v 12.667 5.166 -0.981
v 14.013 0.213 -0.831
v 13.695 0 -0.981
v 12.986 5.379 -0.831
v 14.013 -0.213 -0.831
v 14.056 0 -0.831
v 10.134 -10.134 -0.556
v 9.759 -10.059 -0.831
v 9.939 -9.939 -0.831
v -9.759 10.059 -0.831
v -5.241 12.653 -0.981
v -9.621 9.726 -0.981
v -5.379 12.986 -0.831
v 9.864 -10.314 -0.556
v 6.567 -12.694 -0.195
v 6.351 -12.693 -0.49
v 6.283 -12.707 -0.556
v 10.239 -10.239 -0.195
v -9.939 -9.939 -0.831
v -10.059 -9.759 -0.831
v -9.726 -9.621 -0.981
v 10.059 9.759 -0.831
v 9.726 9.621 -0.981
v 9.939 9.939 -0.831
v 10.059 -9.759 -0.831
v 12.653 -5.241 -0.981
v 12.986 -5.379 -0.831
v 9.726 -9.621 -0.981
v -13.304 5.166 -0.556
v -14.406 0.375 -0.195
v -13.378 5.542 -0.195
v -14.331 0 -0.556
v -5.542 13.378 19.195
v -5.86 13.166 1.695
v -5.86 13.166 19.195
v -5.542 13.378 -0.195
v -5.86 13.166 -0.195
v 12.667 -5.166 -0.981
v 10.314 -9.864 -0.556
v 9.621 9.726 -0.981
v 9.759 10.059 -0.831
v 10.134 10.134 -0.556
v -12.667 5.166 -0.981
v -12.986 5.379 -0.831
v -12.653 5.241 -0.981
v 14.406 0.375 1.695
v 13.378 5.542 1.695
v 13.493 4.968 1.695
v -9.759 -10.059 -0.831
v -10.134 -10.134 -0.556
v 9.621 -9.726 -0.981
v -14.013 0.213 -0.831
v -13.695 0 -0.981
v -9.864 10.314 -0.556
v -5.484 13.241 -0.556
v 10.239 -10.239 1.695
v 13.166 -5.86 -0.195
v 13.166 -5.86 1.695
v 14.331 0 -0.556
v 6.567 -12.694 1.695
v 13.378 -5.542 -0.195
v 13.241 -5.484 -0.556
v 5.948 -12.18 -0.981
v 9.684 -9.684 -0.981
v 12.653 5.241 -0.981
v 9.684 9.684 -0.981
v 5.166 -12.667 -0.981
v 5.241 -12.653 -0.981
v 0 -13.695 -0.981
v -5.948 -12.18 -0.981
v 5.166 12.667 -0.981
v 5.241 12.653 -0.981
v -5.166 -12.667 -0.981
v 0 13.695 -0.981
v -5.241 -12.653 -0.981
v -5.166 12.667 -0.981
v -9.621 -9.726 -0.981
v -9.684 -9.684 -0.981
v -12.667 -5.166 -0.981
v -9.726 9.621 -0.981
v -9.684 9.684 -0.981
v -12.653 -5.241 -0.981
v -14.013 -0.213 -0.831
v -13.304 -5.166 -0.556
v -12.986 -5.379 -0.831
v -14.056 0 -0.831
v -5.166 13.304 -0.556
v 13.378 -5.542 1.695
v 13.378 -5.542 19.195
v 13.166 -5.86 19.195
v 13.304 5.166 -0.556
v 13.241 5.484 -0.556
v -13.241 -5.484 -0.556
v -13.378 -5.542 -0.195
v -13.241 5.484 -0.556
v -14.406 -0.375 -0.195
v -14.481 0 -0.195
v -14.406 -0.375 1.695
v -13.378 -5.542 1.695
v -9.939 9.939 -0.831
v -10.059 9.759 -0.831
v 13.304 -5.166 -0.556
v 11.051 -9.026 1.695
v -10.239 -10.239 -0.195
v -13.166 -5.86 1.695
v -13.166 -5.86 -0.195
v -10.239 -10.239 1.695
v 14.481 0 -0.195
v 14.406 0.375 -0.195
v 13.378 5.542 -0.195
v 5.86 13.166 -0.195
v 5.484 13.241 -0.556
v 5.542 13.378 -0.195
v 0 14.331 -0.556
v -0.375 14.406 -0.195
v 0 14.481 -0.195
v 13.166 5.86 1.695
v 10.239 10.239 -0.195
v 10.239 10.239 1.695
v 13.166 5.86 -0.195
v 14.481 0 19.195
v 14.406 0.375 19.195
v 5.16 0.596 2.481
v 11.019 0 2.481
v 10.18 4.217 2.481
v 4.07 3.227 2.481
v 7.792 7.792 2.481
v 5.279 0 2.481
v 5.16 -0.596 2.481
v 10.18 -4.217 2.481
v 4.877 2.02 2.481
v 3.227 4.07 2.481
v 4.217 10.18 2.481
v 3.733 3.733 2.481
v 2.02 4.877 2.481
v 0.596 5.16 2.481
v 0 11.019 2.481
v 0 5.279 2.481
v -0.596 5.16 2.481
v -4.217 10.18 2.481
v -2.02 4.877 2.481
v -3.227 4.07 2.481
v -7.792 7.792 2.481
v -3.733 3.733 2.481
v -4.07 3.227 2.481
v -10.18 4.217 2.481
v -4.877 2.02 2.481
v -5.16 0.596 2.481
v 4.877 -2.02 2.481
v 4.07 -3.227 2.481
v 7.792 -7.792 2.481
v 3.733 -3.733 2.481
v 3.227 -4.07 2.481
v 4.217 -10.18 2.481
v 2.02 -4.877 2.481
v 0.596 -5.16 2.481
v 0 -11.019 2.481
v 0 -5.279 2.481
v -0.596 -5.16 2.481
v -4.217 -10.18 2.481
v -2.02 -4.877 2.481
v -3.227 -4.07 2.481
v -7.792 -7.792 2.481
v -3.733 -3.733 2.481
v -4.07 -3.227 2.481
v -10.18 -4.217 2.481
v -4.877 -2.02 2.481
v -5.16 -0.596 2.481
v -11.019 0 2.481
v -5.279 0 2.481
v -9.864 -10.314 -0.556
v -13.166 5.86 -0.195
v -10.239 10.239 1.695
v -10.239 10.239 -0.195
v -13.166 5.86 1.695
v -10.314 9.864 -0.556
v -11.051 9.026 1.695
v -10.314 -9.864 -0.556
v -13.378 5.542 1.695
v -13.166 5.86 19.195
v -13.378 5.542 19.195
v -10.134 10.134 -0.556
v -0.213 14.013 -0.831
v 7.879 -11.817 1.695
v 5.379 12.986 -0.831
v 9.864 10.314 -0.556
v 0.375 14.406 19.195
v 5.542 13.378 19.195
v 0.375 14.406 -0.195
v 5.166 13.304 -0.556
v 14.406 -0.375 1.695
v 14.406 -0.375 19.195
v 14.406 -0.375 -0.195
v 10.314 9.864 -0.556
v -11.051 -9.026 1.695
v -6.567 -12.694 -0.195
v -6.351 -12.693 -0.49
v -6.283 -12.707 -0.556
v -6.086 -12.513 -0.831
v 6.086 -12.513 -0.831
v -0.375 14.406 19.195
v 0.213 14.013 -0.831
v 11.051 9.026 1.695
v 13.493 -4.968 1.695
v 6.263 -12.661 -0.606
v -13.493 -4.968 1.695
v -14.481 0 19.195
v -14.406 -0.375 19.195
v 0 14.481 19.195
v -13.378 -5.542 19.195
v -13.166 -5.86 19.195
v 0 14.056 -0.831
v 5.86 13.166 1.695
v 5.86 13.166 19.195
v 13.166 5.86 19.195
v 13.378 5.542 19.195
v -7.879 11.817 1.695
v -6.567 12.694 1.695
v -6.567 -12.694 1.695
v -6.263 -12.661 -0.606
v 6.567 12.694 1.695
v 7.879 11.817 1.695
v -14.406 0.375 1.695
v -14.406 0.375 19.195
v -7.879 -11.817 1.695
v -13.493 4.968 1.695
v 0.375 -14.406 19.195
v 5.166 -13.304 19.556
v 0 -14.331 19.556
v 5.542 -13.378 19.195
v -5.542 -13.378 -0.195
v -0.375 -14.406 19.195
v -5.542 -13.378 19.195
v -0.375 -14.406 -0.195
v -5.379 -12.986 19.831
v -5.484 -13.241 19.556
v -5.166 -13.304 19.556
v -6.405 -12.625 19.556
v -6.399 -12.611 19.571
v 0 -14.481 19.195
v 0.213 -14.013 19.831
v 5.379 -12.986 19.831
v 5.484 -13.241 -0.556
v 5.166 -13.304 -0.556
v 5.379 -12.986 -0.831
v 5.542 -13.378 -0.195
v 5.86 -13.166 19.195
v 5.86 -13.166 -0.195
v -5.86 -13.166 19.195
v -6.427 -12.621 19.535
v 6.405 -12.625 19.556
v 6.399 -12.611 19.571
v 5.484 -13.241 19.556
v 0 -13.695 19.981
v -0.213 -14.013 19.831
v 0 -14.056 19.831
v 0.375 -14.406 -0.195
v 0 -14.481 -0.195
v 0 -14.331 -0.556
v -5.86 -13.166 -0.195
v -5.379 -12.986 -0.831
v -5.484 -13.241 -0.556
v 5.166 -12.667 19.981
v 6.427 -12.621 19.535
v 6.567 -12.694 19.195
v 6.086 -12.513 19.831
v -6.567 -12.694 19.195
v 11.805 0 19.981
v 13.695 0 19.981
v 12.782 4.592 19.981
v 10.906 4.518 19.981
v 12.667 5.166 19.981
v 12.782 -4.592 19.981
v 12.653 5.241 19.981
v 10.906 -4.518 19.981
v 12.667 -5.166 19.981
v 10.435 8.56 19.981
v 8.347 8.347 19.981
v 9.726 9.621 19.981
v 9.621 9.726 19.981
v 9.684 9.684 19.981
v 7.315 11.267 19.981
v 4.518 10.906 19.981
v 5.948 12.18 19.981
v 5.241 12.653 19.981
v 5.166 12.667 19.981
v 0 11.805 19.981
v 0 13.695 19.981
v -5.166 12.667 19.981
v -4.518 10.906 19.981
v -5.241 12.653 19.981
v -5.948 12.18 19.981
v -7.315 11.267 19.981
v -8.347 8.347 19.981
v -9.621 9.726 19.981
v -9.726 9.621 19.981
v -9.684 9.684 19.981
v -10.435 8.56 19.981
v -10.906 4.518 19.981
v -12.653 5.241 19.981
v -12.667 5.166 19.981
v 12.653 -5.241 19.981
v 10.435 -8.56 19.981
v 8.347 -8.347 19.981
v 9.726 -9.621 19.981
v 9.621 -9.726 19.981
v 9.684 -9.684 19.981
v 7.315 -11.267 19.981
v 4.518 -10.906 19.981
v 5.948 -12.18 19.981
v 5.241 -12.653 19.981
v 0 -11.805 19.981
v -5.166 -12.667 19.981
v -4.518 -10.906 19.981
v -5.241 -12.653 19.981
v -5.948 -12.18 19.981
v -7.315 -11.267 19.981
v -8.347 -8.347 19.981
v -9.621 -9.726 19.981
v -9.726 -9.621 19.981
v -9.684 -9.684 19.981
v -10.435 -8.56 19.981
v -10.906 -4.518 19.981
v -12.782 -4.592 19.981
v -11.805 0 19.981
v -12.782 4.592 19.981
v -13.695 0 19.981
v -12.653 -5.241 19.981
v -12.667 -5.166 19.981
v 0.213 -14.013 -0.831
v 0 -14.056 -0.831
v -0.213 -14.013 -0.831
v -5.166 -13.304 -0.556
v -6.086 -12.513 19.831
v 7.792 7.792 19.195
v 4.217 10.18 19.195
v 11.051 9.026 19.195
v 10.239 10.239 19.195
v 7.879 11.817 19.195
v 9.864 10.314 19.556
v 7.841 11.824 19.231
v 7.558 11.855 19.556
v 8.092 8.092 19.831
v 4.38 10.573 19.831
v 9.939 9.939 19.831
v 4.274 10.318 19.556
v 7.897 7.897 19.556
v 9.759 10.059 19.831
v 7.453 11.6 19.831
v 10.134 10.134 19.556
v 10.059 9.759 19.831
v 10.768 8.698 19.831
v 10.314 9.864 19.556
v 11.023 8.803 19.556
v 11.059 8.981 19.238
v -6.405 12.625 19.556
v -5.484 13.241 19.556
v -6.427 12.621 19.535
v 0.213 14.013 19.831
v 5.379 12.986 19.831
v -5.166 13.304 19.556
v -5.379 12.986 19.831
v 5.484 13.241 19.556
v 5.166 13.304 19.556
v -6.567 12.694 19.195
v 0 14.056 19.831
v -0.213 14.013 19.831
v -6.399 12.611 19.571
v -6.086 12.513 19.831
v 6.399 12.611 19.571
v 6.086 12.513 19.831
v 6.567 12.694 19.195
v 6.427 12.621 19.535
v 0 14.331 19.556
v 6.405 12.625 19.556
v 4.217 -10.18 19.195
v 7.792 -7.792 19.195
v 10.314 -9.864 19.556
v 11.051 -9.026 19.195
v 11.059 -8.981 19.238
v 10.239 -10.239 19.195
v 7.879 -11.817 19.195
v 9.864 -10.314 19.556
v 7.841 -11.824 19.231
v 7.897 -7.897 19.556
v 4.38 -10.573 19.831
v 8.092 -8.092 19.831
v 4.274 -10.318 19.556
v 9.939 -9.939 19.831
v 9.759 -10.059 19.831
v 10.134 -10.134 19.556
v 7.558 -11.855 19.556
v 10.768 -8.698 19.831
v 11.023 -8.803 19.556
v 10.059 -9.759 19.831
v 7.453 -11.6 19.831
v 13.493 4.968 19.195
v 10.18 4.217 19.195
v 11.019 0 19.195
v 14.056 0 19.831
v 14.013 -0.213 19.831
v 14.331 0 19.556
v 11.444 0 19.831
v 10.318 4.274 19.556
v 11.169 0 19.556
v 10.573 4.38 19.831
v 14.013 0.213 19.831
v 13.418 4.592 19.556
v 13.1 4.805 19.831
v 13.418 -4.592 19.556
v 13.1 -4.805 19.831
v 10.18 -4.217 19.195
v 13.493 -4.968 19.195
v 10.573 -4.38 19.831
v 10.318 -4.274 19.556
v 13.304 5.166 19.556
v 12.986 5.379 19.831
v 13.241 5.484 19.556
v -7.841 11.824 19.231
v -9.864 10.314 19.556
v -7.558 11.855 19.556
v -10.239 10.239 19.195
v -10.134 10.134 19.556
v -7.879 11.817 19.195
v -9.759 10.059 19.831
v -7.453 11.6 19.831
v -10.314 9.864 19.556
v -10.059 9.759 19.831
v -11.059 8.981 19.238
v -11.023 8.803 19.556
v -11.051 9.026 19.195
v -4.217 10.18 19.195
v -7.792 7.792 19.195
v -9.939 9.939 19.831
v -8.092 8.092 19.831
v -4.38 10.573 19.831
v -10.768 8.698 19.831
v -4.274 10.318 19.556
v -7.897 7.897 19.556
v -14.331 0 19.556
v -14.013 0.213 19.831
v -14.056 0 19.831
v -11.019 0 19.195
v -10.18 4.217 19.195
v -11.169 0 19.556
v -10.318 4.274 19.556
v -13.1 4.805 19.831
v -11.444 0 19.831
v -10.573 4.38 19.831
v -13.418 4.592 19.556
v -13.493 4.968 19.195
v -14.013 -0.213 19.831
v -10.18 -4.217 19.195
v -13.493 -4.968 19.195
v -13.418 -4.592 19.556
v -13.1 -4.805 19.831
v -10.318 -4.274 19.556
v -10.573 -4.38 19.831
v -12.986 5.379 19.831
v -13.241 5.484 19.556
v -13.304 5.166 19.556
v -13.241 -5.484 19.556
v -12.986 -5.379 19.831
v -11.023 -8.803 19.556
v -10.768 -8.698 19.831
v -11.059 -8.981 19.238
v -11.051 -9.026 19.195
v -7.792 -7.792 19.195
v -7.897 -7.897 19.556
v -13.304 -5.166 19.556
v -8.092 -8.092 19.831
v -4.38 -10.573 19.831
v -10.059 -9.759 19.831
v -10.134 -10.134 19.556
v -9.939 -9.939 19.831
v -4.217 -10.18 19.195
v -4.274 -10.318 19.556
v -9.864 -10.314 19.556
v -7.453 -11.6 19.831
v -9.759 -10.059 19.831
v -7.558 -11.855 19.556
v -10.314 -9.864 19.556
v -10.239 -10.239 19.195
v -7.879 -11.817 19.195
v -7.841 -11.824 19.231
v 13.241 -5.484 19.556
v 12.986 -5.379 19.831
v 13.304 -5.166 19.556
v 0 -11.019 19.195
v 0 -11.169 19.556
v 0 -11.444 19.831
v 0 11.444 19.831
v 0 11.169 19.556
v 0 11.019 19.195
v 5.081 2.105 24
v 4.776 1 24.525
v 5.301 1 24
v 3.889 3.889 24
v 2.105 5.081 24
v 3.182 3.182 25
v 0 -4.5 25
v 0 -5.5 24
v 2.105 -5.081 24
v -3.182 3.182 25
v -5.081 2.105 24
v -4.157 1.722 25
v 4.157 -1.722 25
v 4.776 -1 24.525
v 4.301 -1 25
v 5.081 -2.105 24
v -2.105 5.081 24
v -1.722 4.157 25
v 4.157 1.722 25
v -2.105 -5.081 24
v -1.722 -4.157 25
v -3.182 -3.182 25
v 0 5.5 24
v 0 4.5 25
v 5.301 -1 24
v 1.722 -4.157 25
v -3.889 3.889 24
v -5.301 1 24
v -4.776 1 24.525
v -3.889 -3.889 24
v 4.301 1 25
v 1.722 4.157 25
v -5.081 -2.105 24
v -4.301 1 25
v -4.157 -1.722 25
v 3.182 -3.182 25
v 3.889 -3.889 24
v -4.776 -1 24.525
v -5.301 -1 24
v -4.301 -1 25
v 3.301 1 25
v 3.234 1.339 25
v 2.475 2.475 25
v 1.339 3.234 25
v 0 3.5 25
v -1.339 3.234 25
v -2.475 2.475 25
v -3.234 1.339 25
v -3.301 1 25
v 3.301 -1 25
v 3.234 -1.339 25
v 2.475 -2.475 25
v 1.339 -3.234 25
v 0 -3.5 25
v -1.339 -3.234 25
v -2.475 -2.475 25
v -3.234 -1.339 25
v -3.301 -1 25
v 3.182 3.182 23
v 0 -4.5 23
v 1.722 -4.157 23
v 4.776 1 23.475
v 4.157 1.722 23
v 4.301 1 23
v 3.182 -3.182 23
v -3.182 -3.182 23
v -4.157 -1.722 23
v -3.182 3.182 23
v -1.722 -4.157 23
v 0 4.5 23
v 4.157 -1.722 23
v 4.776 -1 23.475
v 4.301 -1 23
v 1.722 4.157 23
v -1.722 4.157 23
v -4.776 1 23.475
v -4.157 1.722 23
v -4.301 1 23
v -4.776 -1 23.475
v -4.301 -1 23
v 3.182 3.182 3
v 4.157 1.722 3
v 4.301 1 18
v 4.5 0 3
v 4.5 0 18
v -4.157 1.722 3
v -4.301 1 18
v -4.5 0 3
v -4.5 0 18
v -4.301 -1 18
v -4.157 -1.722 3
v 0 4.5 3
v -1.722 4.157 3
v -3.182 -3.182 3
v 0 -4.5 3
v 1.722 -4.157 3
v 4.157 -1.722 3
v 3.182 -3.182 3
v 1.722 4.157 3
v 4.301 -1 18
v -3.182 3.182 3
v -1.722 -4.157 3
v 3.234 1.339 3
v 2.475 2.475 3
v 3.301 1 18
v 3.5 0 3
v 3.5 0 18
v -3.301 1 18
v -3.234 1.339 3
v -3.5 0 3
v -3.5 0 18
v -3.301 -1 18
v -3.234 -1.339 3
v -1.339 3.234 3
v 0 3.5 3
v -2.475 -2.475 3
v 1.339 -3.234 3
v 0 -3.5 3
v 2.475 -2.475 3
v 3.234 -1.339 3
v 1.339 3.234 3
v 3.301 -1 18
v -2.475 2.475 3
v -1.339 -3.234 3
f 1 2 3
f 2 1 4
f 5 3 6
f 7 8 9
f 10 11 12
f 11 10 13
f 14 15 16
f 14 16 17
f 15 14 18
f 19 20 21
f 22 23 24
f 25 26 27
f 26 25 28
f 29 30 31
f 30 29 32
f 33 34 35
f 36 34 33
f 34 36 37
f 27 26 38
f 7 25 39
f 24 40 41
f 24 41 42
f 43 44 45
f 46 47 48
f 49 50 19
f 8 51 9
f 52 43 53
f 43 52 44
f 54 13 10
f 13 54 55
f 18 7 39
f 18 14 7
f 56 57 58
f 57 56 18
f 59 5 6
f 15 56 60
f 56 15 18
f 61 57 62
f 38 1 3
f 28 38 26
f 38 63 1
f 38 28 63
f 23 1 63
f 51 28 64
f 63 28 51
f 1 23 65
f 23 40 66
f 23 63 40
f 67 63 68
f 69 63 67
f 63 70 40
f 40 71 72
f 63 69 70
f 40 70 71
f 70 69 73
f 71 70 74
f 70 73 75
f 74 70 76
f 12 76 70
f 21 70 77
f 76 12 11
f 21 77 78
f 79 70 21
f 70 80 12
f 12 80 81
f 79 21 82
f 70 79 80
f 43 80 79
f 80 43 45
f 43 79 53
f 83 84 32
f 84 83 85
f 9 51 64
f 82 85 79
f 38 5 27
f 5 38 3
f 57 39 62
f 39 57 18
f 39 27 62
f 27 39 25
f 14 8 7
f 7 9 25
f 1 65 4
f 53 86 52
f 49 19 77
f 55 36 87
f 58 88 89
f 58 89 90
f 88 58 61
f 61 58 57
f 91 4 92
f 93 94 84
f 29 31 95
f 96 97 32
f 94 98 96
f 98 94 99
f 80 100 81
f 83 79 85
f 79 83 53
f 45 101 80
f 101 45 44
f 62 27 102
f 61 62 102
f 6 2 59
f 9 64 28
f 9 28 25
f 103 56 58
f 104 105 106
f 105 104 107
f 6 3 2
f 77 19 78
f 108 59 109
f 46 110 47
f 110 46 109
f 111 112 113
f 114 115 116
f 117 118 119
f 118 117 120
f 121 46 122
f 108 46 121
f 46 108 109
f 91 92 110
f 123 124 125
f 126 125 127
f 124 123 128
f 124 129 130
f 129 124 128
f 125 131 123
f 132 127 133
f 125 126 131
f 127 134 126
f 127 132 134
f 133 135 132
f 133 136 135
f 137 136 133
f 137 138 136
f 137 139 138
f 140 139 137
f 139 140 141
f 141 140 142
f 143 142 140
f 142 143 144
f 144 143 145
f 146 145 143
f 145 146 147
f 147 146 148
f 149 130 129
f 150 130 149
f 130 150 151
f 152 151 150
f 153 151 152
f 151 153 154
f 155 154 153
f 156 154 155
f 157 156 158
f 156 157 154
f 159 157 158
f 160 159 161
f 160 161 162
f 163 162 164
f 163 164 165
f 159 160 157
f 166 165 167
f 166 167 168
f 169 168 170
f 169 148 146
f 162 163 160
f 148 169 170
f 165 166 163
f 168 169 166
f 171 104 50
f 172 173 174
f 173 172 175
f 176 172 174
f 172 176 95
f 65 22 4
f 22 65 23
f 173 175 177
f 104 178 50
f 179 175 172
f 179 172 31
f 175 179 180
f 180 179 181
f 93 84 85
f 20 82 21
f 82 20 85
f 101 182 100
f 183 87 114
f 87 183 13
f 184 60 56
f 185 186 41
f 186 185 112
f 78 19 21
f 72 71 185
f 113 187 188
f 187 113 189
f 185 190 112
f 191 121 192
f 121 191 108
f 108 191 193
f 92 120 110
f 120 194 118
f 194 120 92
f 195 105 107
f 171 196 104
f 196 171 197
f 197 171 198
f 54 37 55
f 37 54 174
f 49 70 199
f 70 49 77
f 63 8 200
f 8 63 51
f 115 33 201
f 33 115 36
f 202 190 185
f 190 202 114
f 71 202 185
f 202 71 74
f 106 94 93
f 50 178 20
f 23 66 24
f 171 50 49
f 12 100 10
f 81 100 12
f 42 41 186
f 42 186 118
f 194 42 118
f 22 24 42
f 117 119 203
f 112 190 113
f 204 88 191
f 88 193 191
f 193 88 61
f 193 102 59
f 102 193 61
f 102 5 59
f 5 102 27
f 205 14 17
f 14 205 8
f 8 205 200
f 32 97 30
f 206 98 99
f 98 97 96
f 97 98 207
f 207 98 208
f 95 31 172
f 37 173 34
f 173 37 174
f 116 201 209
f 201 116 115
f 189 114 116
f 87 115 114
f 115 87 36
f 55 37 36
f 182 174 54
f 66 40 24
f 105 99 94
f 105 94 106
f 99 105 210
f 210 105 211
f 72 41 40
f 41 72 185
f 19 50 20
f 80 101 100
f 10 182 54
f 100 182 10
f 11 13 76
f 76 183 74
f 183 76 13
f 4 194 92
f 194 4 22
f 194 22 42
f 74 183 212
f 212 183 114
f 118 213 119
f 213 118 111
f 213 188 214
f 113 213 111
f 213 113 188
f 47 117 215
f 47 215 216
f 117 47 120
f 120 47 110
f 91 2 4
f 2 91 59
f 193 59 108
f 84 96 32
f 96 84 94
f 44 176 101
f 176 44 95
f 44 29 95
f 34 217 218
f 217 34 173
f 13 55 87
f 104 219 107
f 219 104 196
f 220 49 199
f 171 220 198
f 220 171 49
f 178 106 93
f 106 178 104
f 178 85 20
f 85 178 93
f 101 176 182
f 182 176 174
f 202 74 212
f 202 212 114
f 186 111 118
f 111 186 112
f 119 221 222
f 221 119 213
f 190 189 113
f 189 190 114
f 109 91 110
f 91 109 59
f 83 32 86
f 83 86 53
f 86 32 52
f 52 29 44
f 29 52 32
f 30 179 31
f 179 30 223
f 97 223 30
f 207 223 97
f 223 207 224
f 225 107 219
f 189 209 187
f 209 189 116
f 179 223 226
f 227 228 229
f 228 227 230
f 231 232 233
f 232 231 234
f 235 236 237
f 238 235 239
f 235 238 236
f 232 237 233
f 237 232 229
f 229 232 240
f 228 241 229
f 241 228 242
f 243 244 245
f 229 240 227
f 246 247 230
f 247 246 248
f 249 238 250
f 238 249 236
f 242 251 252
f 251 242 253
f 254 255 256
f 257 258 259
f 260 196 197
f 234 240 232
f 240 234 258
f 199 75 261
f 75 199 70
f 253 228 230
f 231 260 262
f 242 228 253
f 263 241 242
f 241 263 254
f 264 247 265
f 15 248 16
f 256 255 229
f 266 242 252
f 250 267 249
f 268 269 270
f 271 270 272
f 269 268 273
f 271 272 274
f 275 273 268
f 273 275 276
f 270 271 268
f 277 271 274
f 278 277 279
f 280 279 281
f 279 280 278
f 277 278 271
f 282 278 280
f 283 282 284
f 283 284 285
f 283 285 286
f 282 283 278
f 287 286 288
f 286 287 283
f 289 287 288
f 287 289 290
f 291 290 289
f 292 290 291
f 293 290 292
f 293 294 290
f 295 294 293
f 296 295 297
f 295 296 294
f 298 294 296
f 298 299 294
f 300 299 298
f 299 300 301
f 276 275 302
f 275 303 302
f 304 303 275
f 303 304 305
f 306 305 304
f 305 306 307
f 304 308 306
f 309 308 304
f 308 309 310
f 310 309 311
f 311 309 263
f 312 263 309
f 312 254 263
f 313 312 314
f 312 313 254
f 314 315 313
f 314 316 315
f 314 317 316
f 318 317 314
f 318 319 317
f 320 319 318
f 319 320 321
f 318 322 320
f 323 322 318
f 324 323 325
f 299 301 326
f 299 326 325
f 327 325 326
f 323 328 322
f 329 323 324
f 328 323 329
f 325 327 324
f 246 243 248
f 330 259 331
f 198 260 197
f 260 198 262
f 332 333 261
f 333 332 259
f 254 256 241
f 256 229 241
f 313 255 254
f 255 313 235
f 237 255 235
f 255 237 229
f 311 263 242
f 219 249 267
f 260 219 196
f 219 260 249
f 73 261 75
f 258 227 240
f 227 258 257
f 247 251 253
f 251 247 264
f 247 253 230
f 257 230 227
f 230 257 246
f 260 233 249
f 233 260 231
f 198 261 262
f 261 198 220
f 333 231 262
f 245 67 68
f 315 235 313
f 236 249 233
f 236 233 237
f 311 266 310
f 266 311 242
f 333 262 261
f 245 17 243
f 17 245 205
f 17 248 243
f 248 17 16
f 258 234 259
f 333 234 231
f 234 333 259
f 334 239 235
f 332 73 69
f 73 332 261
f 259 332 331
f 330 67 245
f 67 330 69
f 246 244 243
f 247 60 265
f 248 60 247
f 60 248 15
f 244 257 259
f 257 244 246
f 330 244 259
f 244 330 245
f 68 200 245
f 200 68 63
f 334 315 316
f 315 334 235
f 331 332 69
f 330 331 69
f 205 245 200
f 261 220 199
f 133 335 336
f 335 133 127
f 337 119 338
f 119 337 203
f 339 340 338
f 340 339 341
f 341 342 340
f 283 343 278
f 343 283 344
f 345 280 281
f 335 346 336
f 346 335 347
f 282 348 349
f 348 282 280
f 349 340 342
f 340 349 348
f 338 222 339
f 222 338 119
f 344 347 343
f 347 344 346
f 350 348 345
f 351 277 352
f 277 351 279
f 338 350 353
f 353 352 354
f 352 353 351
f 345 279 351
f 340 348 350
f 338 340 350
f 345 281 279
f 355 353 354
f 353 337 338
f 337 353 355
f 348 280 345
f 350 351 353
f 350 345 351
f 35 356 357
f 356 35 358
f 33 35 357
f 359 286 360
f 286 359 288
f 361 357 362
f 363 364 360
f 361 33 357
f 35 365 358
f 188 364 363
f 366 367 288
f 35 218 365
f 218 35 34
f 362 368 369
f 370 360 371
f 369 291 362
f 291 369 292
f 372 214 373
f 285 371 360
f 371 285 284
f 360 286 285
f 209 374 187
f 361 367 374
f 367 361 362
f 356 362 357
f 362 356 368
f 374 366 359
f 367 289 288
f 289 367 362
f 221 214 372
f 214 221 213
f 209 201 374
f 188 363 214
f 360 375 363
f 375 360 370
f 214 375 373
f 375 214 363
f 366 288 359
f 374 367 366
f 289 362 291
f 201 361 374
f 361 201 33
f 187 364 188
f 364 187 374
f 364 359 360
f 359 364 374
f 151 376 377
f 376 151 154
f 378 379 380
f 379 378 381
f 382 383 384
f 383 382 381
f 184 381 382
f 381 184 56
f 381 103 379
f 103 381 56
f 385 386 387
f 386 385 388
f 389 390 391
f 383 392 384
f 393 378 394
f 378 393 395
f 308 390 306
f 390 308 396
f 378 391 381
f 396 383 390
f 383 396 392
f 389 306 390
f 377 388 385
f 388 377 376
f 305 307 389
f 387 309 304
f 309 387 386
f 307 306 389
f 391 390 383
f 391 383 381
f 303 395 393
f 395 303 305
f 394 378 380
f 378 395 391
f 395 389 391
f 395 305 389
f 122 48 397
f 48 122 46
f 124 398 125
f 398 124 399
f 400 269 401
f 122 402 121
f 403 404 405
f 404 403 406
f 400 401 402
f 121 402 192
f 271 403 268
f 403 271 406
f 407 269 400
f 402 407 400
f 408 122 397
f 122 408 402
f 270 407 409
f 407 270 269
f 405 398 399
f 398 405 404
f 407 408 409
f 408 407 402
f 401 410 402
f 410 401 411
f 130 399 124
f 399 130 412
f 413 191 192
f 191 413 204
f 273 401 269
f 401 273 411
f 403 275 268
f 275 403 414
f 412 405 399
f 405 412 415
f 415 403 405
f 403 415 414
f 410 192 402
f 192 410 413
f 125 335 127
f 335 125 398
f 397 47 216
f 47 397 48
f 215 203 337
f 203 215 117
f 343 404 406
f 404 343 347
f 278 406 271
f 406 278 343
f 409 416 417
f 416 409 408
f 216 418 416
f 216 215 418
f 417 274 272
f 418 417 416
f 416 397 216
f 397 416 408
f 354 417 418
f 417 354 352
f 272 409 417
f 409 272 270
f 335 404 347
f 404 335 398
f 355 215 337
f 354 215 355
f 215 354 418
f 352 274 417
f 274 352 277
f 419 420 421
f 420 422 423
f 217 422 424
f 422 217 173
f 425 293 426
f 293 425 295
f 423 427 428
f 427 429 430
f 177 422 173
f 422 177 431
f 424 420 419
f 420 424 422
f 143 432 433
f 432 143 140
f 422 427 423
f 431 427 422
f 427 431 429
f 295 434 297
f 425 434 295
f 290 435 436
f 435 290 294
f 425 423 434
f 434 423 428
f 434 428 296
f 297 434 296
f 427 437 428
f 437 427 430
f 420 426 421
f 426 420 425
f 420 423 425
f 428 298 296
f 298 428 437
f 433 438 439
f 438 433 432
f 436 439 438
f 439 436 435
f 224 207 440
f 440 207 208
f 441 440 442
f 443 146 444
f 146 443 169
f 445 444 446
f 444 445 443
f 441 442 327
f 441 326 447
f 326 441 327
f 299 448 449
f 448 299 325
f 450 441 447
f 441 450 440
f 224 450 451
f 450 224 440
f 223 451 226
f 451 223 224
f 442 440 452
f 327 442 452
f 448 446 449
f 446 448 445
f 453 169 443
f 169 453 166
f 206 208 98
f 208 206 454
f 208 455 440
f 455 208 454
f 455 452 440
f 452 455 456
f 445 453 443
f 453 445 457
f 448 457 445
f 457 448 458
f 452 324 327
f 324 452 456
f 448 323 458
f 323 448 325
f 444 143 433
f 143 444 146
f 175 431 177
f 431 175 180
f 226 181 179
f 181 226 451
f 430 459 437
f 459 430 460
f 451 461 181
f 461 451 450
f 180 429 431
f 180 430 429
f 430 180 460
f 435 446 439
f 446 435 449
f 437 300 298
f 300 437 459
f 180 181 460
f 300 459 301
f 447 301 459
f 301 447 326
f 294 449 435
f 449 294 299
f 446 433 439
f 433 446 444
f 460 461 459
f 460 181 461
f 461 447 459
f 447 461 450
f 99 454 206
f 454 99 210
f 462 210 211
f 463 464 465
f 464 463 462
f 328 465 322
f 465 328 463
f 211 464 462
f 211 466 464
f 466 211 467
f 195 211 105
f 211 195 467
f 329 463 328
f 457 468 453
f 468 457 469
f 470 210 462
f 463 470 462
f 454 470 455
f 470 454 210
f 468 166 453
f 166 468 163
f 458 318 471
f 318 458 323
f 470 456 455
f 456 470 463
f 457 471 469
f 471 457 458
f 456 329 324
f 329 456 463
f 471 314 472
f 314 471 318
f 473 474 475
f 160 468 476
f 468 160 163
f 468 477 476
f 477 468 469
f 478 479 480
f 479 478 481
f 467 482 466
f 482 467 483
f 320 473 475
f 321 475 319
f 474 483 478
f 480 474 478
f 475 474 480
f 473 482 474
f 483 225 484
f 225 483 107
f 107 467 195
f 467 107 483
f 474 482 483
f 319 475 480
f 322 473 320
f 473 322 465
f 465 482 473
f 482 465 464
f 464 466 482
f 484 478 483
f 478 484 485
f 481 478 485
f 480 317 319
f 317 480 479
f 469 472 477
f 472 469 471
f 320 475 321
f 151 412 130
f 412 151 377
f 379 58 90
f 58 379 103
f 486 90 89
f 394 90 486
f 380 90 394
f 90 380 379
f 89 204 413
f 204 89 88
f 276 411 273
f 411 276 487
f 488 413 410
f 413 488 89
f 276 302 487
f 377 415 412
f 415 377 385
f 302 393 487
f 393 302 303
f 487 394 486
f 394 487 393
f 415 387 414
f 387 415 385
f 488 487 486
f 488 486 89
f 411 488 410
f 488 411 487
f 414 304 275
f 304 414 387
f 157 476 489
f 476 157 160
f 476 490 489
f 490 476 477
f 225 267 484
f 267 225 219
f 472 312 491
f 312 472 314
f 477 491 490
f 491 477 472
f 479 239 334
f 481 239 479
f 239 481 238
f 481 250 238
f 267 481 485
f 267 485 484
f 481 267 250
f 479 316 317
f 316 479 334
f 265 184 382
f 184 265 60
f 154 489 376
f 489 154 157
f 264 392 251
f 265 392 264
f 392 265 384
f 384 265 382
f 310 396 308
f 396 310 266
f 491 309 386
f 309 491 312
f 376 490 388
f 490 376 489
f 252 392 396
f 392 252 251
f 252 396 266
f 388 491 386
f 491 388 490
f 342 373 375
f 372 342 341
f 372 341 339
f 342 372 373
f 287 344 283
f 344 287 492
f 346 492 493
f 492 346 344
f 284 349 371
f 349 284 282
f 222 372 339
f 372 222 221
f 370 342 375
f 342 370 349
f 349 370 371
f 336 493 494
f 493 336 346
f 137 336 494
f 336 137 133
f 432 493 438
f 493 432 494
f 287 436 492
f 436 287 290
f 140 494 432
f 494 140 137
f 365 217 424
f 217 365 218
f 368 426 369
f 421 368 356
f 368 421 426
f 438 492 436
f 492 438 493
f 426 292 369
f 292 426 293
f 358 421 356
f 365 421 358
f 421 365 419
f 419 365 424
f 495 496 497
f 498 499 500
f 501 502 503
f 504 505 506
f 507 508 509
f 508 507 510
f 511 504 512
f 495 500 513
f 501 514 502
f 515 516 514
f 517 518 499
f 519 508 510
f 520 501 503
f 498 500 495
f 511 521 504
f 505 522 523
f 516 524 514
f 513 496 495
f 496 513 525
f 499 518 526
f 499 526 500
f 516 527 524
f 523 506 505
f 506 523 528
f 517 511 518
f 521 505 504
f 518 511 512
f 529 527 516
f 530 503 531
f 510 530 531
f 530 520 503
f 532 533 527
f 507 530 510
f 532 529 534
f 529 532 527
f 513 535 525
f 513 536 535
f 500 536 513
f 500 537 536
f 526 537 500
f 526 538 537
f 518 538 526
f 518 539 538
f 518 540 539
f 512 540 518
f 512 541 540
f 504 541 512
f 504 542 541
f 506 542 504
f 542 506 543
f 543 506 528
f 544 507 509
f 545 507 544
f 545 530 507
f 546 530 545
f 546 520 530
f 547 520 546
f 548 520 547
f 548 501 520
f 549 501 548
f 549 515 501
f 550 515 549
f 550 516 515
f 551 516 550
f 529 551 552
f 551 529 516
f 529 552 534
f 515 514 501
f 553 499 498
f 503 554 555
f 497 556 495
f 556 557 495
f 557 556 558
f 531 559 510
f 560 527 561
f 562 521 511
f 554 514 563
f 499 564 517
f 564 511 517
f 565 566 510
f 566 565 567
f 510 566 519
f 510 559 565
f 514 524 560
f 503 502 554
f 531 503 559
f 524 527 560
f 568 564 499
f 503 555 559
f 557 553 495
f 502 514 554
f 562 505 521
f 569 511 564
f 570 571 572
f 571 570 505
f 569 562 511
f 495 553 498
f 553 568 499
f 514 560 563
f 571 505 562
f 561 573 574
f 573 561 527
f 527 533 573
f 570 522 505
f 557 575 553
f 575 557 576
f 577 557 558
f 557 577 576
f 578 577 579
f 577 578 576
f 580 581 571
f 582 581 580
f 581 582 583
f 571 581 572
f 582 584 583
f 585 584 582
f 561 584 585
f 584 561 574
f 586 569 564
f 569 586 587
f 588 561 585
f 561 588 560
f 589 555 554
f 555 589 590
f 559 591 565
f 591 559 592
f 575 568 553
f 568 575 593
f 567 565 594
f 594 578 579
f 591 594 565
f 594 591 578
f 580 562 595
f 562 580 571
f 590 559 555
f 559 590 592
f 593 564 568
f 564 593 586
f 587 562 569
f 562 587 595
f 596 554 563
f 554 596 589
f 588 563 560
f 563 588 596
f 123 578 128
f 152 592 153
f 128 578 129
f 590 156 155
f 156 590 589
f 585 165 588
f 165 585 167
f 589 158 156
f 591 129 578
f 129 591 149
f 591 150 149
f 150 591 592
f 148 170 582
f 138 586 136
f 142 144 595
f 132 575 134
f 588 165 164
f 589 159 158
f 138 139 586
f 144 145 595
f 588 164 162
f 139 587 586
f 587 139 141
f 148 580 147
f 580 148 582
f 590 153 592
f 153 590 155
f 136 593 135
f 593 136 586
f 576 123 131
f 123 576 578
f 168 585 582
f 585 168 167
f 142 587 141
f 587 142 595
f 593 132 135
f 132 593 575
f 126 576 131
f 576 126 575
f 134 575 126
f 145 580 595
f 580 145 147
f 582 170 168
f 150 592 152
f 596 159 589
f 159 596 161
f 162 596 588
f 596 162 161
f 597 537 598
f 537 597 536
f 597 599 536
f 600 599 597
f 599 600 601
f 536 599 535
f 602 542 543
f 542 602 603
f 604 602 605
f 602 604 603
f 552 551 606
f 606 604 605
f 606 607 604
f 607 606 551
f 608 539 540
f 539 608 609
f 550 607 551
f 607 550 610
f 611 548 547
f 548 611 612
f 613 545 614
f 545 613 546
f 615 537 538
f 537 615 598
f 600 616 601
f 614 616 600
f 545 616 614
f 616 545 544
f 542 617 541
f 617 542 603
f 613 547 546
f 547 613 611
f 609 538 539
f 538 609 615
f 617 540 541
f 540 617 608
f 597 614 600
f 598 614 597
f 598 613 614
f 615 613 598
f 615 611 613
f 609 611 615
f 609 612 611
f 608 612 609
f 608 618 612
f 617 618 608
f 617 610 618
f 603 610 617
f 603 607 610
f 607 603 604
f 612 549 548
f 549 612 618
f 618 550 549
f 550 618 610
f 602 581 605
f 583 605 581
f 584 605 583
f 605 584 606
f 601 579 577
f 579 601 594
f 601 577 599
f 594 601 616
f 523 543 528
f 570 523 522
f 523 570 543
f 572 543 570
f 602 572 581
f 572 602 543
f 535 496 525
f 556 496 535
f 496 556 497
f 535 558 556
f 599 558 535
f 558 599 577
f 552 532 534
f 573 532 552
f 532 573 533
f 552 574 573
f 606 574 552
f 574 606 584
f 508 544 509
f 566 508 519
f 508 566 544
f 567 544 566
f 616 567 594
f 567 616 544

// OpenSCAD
$fn = 16;

c_diameter = 27;
c_height = 19;
c_thickness = 3;
c_rounding = 1;

s_diameter = 9;
s_height = 25;
s_thickness = 2;
s_cut = 7;

c_radius = c_diameter / 2;
c_r_thick = c_thickness / 2;
s_radius = s_diameter / 2;
s_r_thick = s_thickness / 2;

module knob() {
    minkowski() {
        #difference() {
            cylinder(c_height, c_radius, c_radius);
            translate([0, 0, c_r_thick])
                cylinder(c_height, c_radius - c_r_thick, c_radius - c_r_thick);
        }
        sphere(c_rounding);
    }
}

module shaft() {
    difference() {
        union () {
            cylinder(s_height, s_radius, s_radius);
            translate([0, 0, s_height - 2]) union () {
                translate([0, 0, 1])
                    cylinder(1, s_radius + 1, s_radius);
                cylinder(1, s_radius, s_radius + 1);
            }
            cylinder(c_thickness, s_diameter, s_radius);
        }
        translate([0, 0, c_r_thick * 2])
            cylinder(s_height, s_radius - s_r_thick, s_radius - s_r_thick);
        translate([0, 0, s_height - s_cut])
            linear_extrude(s_cut + 1)
                square([s_diameter+3, 2],center=true);
    }
}

module assembly() {
    union () {
        knob();
        shaft();
    }
}

assembly();
